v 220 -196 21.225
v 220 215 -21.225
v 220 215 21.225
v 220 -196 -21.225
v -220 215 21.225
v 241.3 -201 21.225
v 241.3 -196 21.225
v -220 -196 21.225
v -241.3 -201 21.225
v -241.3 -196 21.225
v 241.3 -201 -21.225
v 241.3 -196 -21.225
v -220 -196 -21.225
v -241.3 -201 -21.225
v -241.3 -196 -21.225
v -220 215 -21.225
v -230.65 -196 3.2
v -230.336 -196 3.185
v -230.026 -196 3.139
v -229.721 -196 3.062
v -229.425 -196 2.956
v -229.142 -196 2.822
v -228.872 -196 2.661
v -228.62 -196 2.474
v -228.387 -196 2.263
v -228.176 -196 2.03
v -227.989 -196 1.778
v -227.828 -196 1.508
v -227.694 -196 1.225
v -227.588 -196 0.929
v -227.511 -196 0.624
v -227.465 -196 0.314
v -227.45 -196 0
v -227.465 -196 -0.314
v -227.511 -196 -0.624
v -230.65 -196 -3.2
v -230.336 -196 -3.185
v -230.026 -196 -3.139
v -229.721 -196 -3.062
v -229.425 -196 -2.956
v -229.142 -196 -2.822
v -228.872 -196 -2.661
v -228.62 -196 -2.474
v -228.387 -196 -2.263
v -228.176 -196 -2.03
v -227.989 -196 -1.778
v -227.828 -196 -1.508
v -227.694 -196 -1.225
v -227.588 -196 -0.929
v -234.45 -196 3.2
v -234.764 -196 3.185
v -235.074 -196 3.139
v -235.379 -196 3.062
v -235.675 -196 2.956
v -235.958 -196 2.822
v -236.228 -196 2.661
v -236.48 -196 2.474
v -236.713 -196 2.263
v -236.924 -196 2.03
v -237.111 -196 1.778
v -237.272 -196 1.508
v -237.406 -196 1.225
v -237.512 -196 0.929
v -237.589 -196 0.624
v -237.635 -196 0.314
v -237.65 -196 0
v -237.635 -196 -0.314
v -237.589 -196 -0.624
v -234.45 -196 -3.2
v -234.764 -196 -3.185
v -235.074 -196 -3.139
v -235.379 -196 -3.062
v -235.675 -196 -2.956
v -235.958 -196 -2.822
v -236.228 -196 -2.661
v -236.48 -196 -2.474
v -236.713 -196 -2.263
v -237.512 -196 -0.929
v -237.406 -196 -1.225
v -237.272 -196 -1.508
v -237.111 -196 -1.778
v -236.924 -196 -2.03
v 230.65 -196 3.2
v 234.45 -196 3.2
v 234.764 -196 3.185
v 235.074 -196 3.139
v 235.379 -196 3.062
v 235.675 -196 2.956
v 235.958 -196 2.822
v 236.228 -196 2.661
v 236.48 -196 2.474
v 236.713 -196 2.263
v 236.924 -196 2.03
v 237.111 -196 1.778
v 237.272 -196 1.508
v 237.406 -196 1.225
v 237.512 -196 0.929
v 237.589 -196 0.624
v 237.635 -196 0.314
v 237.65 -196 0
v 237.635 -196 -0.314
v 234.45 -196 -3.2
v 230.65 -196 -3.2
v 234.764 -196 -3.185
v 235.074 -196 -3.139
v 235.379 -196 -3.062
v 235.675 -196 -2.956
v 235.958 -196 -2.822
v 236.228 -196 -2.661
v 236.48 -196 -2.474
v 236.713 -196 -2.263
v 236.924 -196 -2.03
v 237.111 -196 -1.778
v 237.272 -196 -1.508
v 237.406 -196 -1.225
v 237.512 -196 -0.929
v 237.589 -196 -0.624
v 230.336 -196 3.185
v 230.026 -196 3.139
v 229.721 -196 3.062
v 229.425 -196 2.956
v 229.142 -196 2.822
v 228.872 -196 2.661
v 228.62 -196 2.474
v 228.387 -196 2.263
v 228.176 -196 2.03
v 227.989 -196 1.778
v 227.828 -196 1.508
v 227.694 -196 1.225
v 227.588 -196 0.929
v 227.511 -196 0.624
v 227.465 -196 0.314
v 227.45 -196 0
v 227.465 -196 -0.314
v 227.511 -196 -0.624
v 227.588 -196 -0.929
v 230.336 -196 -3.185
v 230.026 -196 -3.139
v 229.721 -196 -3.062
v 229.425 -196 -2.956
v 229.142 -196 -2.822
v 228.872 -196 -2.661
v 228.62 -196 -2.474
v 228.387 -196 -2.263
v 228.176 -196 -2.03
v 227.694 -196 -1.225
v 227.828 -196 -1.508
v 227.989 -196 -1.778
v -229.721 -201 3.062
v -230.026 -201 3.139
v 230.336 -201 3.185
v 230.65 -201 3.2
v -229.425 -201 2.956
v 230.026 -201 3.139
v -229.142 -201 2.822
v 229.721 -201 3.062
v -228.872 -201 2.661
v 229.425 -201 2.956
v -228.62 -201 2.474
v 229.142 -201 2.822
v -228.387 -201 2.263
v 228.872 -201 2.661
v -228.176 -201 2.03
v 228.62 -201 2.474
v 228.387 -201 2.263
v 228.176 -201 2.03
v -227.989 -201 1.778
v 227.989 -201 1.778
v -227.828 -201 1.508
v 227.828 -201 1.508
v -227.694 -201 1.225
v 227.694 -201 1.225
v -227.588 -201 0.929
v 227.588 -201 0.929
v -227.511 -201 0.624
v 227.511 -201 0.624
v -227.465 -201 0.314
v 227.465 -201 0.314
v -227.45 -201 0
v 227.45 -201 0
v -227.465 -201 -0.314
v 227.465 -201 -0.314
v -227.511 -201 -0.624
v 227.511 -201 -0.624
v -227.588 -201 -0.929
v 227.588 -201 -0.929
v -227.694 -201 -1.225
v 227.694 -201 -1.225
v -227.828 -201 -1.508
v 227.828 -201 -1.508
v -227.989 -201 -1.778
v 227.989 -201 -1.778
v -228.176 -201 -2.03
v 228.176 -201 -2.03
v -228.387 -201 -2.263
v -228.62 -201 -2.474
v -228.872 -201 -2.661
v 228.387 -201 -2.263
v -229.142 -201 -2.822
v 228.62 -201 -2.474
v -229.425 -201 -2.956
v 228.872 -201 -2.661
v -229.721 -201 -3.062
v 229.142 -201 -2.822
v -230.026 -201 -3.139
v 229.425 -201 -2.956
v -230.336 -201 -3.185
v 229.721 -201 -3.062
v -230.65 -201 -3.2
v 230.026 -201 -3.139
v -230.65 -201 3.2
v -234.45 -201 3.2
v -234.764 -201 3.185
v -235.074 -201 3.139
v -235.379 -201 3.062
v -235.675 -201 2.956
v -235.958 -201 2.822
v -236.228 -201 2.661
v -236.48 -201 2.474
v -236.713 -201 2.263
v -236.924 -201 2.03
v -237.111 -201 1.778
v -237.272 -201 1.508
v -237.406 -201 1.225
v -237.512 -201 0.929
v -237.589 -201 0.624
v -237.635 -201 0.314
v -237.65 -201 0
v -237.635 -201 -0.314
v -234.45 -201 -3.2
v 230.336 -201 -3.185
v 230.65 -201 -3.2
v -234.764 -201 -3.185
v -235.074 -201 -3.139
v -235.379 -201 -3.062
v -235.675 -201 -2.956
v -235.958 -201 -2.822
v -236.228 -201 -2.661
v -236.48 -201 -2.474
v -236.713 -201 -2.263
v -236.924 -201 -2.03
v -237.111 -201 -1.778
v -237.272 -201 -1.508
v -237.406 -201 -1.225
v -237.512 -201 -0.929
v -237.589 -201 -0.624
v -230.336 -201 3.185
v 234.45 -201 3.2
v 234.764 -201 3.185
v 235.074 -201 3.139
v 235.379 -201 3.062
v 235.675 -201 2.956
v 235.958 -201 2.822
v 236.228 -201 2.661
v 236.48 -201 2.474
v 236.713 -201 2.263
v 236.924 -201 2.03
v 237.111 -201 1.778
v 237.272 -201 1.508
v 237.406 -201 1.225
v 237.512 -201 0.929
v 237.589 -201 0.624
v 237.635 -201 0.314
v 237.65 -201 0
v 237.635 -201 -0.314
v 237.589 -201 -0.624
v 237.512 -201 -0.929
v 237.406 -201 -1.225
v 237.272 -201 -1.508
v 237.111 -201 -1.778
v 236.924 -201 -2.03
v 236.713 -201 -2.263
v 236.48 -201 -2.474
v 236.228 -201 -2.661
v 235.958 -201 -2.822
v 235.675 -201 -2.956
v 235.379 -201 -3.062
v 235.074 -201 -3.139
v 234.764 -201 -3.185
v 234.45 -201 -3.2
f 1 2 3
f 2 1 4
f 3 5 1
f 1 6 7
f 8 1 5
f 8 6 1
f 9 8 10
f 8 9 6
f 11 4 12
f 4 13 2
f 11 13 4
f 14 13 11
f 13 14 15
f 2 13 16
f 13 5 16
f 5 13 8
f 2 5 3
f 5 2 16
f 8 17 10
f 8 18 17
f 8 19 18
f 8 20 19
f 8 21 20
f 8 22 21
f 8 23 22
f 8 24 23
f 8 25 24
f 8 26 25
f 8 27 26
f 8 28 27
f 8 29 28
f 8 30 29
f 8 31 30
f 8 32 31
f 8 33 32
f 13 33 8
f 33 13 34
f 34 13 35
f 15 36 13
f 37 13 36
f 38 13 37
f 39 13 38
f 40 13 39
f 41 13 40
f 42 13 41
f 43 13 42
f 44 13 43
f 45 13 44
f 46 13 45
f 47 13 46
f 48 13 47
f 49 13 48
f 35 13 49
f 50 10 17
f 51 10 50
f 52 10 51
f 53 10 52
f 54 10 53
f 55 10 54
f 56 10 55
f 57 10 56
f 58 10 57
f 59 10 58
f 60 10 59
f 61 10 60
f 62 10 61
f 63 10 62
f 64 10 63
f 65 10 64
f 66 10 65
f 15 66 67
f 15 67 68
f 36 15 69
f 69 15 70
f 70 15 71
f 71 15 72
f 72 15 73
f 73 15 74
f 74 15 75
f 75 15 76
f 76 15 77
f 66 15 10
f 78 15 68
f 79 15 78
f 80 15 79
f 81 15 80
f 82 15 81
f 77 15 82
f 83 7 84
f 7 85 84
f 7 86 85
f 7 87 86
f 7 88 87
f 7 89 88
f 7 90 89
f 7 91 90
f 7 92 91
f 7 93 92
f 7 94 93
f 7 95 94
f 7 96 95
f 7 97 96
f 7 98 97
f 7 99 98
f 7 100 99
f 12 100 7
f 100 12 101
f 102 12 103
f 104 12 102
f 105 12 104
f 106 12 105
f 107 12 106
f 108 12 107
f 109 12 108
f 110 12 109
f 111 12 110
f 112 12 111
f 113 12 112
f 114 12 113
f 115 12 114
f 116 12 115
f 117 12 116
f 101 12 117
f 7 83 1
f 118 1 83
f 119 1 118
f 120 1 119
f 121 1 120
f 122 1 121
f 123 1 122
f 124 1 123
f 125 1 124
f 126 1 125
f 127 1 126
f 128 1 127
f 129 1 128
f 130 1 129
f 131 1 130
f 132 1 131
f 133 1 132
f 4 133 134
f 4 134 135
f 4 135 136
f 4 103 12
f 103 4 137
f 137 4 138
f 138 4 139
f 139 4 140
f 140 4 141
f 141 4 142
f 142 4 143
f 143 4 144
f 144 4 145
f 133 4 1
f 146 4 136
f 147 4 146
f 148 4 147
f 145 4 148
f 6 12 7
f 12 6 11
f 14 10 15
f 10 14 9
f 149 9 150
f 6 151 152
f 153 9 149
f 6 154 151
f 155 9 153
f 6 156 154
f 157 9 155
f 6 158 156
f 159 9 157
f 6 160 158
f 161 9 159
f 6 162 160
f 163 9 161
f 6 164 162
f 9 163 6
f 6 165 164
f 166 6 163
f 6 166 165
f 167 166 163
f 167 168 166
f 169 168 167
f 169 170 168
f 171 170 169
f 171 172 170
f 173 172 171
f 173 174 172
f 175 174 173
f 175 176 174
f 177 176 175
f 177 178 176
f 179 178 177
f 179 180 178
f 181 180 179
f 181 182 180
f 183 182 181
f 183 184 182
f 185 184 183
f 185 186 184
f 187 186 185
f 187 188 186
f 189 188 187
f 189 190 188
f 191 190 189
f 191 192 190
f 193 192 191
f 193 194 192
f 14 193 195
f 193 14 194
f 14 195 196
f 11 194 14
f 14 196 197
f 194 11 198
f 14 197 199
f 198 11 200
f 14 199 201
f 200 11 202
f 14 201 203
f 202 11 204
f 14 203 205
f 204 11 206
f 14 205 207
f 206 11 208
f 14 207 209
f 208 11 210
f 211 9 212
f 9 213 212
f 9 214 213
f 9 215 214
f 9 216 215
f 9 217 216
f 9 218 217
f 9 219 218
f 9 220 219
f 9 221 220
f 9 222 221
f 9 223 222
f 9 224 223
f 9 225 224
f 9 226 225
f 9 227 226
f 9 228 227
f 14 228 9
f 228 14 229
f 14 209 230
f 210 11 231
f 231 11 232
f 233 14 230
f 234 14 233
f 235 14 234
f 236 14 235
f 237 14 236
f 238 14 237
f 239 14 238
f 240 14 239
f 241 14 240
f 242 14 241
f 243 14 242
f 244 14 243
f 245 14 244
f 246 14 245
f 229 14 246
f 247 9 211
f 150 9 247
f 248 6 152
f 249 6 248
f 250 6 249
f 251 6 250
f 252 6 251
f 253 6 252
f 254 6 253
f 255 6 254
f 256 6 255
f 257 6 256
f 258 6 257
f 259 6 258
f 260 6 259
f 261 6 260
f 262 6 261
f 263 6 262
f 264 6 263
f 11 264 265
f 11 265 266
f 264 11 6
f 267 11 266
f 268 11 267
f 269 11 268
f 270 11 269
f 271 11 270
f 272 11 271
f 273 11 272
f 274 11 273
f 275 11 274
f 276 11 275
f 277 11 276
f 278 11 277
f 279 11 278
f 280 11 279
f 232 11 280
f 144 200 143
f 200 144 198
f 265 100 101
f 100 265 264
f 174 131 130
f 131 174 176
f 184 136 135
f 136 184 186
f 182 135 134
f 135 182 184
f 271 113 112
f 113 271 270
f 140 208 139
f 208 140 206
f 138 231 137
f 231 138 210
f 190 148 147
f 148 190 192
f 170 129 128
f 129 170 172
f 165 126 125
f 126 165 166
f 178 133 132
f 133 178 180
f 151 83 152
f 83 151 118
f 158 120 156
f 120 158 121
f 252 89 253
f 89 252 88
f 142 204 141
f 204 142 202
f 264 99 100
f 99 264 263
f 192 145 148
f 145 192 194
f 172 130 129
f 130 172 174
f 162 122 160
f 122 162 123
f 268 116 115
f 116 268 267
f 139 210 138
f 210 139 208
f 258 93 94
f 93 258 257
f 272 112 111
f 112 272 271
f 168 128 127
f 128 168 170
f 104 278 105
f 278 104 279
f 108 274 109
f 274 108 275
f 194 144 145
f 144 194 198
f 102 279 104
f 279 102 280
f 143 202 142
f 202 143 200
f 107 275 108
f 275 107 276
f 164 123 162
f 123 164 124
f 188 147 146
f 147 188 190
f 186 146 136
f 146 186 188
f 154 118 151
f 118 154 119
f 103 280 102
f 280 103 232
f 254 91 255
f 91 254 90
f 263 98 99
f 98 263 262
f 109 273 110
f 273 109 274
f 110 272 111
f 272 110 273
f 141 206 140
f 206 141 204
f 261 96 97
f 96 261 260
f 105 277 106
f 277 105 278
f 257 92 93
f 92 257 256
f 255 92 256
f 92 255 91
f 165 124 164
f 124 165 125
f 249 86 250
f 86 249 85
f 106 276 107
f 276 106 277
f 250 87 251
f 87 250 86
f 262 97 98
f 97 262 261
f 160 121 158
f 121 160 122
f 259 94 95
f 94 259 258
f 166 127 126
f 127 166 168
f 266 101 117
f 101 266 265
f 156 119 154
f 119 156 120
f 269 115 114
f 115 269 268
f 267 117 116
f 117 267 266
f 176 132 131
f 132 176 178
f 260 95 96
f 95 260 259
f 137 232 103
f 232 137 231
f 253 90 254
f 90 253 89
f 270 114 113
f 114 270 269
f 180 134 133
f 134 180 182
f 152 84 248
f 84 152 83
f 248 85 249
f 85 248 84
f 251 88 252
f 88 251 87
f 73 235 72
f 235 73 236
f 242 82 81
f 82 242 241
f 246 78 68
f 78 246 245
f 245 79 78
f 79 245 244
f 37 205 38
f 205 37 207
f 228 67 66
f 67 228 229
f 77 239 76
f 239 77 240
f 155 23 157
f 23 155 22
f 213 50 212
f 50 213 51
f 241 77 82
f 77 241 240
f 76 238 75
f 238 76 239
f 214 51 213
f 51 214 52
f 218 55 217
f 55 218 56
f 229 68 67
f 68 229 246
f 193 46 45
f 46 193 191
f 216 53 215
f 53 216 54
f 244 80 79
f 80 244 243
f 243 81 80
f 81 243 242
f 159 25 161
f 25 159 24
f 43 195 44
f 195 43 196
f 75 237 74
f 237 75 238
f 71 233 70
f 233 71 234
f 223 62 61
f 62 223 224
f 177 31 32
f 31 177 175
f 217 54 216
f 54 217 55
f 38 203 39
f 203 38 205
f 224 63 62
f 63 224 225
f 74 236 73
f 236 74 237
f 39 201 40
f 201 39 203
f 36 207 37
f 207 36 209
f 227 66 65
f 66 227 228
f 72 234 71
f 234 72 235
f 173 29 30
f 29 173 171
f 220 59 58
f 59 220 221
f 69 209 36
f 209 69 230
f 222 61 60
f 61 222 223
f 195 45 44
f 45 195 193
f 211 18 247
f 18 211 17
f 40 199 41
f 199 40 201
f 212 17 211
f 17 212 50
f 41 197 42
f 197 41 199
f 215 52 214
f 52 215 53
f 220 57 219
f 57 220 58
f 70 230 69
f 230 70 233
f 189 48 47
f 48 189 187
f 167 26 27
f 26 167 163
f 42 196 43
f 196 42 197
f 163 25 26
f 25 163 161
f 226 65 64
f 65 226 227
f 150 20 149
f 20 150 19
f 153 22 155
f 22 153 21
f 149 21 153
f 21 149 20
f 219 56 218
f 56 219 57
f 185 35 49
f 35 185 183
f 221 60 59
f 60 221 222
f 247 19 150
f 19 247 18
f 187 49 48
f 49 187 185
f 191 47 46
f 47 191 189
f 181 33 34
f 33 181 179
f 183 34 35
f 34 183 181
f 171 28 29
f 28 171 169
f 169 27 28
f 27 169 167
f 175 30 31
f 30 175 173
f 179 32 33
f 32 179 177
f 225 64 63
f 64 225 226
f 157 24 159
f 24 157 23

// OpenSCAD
// ============================================================================
// Atom Lithography Machine — Parametric OpenSCAD Module (S1.4-03)
// ============================================================================
// part_id           : S1.4-03
// parent_bom_id     : S1.4
// subsystem         : S1
// part_name         : Kapali-cevrim demet dozu PID denetleyici ve hizli surgu
// material          : Al 6061
// temp_stage        : 300 K (kabin)
// vacuum_grade      : Atmosfer/UHV
// tolerance         : <1 ms tepki
// computed_mass_kg  : 5.43326
// envelope_mm       : 482.600 x 442.500 x 42.450
// design_maturity   : M0_M1_DETAILED_CAD_DESIGN_ONLY
// no_lab_measurement: true
// iec61508_certified: false
// semi_s2_certified : false
// Units: millimeters (mm)
// ============================================================================

$fn = 64;

// Nominal bounding envelope parameters (mm)
bbox_x = 482.6000;
bbox_y = 442.5000;
bbox_z = 42.4500;

// Part-specific parametric dimensions
rack_u = 1;
u_slot = "U32";
response_ms = 1.0;
dose_rms_pct = 1.0;

// Interface / port parameters (mm)
port_pid_feedback_bus_od = 14.000;

module part_S1_4_03() {
  difference() {
    union() {
      // 1U hollow 19-in chassis body (width along X)
      translate([0.000, 9.500, 0.000]) cube([440.000, 411.000, 42.450], center=true);
      // EIA-310 19-in front panel w/ mounting ears facing -Y
      translate([0.000, -198.500, 0.000]) cube([482.600, 5.000, 42.450], center=true);
    }
    // EIA-310 +X rack slot
    translate([232.550, -198.500, 0.000]) rotate([90.000, 0.000, 0.000]) {
      hull() {
        translate([-1.900, 0, 0]) cylinder(d=6.400, h=9.000, center=true);
        translate([1.900, 0, 0]) cylinder(d=6.400, h=9.000, center=true);
      }
    }
    // EIA-310 -X rack slot
    translate([-232.550, -198.500, 0.000]) rotate([90.000, 0.000, 0.000]) {
      hull() {
        translate([-1.900, 0, 0]) cylinder(d=6.400, h=9.000, center=true);
        translate([1.900, 0, 0]) cylinder(d=6.400, h=9.000, center=true);
      }
    }
  }
}

// World assembly mounting transform (global machine frame, mm / deg):
// translate([1480.000, -223.000, 990.175]) rotate([0.000, 0.000, 0.000]) part_S1_4_03();

part_S1_4_03();
